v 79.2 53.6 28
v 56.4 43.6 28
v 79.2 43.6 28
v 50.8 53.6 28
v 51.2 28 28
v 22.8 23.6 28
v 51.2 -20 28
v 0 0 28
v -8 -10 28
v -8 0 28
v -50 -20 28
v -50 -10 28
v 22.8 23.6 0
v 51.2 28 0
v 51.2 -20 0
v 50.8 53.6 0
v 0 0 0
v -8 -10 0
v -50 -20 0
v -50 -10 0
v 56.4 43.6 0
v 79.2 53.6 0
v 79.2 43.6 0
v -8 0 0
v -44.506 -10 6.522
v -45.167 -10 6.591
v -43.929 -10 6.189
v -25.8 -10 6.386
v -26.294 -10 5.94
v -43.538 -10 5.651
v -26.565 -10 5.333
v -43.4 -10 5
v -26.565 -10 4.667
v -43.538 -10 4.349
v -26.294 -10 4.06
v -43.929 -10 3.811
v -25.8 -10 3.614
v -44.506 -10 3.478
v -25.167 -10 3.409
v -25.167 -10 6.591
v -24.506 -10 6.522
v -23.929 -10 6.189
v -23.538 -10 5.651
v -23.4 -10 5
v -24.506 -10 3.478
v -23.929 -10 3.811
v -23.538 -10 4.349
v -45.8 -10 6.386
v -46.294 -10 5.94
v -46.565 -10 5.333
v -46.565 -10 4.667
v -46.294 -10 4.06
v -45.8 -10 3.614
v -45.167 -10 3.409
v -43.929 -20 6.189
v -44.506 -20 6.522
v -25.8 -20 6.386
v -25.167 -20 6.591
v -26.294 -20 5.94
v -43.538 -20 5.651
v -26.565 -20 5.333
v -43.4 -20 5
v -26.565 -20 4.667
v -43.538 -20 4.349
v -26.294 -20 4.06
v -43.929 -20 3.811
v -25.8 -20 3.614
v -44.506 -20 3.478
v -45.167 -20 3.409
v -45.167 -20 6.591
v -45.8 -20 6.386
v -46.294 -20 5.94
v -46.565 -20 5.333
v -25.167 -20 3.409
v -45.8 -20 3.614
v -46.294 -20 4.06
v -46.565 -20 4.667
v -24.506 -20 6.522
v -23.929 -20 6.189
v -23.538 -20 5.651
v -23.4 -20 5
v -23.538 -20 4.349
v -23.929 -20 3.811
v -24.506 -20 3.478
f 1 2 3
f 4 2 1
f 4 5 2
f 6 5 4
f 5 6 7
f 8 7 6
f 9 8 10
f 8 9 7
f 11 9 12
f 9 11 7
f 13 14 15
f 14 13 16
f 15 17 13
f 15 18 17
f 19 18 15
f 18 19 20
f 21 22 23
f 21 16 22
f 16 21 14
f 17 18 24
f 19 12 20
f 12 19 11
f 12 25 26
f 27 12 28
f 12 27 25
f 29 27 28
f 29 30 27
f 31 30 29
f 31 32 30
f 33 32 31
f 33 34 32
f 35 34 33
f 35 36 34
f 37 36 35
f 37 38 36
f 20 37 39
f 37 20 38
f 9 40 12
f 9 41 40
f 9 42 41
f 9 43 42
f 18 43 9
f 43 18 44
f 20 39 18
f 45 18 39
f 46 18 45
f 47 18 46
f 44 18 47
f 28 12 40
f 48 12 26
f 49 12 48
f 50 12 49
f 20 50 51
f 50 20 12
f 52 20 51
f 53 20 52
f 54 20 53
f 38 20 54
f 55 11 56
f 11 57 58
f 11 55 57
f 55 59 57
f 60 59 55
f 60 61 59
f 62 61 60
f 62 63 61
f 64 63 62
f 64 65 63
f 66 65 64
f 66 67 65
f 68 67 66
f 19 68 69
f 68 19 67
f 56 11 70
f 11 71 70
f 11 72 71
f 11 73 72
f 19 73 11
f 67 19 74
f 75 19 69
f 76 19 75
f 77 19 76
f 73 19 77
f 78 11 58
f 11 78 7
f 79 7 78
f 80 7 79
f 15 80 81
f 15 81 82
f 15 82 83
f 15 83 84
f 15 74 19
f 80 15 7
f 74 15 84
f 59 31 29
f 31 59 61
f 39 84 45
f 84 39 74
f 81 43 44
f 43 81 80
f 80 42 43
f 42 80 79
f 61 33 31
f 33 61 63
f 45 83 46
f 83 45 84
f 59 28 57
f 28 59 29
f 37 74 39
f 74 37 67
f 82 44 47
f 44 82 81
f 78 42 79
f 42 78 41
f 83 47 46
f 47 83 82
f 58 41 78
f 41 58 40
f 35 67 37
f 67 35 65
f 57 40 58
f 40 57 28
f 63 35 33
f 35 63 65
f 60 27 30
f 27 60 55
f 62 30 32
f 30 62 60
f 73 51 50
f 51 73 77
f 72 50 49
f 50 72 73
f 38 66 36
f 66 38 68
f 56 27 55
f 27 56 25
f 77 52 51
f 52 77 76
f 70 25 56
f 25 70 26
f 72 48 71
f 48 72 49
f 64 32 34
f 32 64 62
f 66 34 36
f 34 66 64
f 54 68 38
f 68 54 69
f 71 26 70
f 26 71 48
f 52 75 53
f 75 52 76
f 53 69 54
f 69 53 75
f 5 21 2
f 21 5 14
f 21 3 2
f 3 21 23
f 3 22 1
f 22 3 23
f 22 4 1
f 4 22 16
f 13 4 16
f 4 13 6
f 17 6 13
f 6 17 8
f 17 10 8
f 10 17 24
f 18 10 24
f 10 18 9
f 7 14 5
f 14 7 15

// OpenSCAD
difference(){
scale([2,2,2])
linear_extrude(height=14)
polygon([[25.6,-10],[25.6,14],[28.2,21.8],[39.6,21.8],[39.6,26.8],[25.4,26.8],[11.4,11.8],[0,0],[-4,0],[-4,-10]]);
}
difference(){
translate([-50,-20,0])
cube([50,10,28]);
translate([-25,-4,5])rotate([90,0,0])
    cylinder(d=3.2,h=40,$fn=15);
translate([-45,-4,5])rotate([90,0,0])
    cylinder(d=3.2,h=40,$fn=15);    
}
